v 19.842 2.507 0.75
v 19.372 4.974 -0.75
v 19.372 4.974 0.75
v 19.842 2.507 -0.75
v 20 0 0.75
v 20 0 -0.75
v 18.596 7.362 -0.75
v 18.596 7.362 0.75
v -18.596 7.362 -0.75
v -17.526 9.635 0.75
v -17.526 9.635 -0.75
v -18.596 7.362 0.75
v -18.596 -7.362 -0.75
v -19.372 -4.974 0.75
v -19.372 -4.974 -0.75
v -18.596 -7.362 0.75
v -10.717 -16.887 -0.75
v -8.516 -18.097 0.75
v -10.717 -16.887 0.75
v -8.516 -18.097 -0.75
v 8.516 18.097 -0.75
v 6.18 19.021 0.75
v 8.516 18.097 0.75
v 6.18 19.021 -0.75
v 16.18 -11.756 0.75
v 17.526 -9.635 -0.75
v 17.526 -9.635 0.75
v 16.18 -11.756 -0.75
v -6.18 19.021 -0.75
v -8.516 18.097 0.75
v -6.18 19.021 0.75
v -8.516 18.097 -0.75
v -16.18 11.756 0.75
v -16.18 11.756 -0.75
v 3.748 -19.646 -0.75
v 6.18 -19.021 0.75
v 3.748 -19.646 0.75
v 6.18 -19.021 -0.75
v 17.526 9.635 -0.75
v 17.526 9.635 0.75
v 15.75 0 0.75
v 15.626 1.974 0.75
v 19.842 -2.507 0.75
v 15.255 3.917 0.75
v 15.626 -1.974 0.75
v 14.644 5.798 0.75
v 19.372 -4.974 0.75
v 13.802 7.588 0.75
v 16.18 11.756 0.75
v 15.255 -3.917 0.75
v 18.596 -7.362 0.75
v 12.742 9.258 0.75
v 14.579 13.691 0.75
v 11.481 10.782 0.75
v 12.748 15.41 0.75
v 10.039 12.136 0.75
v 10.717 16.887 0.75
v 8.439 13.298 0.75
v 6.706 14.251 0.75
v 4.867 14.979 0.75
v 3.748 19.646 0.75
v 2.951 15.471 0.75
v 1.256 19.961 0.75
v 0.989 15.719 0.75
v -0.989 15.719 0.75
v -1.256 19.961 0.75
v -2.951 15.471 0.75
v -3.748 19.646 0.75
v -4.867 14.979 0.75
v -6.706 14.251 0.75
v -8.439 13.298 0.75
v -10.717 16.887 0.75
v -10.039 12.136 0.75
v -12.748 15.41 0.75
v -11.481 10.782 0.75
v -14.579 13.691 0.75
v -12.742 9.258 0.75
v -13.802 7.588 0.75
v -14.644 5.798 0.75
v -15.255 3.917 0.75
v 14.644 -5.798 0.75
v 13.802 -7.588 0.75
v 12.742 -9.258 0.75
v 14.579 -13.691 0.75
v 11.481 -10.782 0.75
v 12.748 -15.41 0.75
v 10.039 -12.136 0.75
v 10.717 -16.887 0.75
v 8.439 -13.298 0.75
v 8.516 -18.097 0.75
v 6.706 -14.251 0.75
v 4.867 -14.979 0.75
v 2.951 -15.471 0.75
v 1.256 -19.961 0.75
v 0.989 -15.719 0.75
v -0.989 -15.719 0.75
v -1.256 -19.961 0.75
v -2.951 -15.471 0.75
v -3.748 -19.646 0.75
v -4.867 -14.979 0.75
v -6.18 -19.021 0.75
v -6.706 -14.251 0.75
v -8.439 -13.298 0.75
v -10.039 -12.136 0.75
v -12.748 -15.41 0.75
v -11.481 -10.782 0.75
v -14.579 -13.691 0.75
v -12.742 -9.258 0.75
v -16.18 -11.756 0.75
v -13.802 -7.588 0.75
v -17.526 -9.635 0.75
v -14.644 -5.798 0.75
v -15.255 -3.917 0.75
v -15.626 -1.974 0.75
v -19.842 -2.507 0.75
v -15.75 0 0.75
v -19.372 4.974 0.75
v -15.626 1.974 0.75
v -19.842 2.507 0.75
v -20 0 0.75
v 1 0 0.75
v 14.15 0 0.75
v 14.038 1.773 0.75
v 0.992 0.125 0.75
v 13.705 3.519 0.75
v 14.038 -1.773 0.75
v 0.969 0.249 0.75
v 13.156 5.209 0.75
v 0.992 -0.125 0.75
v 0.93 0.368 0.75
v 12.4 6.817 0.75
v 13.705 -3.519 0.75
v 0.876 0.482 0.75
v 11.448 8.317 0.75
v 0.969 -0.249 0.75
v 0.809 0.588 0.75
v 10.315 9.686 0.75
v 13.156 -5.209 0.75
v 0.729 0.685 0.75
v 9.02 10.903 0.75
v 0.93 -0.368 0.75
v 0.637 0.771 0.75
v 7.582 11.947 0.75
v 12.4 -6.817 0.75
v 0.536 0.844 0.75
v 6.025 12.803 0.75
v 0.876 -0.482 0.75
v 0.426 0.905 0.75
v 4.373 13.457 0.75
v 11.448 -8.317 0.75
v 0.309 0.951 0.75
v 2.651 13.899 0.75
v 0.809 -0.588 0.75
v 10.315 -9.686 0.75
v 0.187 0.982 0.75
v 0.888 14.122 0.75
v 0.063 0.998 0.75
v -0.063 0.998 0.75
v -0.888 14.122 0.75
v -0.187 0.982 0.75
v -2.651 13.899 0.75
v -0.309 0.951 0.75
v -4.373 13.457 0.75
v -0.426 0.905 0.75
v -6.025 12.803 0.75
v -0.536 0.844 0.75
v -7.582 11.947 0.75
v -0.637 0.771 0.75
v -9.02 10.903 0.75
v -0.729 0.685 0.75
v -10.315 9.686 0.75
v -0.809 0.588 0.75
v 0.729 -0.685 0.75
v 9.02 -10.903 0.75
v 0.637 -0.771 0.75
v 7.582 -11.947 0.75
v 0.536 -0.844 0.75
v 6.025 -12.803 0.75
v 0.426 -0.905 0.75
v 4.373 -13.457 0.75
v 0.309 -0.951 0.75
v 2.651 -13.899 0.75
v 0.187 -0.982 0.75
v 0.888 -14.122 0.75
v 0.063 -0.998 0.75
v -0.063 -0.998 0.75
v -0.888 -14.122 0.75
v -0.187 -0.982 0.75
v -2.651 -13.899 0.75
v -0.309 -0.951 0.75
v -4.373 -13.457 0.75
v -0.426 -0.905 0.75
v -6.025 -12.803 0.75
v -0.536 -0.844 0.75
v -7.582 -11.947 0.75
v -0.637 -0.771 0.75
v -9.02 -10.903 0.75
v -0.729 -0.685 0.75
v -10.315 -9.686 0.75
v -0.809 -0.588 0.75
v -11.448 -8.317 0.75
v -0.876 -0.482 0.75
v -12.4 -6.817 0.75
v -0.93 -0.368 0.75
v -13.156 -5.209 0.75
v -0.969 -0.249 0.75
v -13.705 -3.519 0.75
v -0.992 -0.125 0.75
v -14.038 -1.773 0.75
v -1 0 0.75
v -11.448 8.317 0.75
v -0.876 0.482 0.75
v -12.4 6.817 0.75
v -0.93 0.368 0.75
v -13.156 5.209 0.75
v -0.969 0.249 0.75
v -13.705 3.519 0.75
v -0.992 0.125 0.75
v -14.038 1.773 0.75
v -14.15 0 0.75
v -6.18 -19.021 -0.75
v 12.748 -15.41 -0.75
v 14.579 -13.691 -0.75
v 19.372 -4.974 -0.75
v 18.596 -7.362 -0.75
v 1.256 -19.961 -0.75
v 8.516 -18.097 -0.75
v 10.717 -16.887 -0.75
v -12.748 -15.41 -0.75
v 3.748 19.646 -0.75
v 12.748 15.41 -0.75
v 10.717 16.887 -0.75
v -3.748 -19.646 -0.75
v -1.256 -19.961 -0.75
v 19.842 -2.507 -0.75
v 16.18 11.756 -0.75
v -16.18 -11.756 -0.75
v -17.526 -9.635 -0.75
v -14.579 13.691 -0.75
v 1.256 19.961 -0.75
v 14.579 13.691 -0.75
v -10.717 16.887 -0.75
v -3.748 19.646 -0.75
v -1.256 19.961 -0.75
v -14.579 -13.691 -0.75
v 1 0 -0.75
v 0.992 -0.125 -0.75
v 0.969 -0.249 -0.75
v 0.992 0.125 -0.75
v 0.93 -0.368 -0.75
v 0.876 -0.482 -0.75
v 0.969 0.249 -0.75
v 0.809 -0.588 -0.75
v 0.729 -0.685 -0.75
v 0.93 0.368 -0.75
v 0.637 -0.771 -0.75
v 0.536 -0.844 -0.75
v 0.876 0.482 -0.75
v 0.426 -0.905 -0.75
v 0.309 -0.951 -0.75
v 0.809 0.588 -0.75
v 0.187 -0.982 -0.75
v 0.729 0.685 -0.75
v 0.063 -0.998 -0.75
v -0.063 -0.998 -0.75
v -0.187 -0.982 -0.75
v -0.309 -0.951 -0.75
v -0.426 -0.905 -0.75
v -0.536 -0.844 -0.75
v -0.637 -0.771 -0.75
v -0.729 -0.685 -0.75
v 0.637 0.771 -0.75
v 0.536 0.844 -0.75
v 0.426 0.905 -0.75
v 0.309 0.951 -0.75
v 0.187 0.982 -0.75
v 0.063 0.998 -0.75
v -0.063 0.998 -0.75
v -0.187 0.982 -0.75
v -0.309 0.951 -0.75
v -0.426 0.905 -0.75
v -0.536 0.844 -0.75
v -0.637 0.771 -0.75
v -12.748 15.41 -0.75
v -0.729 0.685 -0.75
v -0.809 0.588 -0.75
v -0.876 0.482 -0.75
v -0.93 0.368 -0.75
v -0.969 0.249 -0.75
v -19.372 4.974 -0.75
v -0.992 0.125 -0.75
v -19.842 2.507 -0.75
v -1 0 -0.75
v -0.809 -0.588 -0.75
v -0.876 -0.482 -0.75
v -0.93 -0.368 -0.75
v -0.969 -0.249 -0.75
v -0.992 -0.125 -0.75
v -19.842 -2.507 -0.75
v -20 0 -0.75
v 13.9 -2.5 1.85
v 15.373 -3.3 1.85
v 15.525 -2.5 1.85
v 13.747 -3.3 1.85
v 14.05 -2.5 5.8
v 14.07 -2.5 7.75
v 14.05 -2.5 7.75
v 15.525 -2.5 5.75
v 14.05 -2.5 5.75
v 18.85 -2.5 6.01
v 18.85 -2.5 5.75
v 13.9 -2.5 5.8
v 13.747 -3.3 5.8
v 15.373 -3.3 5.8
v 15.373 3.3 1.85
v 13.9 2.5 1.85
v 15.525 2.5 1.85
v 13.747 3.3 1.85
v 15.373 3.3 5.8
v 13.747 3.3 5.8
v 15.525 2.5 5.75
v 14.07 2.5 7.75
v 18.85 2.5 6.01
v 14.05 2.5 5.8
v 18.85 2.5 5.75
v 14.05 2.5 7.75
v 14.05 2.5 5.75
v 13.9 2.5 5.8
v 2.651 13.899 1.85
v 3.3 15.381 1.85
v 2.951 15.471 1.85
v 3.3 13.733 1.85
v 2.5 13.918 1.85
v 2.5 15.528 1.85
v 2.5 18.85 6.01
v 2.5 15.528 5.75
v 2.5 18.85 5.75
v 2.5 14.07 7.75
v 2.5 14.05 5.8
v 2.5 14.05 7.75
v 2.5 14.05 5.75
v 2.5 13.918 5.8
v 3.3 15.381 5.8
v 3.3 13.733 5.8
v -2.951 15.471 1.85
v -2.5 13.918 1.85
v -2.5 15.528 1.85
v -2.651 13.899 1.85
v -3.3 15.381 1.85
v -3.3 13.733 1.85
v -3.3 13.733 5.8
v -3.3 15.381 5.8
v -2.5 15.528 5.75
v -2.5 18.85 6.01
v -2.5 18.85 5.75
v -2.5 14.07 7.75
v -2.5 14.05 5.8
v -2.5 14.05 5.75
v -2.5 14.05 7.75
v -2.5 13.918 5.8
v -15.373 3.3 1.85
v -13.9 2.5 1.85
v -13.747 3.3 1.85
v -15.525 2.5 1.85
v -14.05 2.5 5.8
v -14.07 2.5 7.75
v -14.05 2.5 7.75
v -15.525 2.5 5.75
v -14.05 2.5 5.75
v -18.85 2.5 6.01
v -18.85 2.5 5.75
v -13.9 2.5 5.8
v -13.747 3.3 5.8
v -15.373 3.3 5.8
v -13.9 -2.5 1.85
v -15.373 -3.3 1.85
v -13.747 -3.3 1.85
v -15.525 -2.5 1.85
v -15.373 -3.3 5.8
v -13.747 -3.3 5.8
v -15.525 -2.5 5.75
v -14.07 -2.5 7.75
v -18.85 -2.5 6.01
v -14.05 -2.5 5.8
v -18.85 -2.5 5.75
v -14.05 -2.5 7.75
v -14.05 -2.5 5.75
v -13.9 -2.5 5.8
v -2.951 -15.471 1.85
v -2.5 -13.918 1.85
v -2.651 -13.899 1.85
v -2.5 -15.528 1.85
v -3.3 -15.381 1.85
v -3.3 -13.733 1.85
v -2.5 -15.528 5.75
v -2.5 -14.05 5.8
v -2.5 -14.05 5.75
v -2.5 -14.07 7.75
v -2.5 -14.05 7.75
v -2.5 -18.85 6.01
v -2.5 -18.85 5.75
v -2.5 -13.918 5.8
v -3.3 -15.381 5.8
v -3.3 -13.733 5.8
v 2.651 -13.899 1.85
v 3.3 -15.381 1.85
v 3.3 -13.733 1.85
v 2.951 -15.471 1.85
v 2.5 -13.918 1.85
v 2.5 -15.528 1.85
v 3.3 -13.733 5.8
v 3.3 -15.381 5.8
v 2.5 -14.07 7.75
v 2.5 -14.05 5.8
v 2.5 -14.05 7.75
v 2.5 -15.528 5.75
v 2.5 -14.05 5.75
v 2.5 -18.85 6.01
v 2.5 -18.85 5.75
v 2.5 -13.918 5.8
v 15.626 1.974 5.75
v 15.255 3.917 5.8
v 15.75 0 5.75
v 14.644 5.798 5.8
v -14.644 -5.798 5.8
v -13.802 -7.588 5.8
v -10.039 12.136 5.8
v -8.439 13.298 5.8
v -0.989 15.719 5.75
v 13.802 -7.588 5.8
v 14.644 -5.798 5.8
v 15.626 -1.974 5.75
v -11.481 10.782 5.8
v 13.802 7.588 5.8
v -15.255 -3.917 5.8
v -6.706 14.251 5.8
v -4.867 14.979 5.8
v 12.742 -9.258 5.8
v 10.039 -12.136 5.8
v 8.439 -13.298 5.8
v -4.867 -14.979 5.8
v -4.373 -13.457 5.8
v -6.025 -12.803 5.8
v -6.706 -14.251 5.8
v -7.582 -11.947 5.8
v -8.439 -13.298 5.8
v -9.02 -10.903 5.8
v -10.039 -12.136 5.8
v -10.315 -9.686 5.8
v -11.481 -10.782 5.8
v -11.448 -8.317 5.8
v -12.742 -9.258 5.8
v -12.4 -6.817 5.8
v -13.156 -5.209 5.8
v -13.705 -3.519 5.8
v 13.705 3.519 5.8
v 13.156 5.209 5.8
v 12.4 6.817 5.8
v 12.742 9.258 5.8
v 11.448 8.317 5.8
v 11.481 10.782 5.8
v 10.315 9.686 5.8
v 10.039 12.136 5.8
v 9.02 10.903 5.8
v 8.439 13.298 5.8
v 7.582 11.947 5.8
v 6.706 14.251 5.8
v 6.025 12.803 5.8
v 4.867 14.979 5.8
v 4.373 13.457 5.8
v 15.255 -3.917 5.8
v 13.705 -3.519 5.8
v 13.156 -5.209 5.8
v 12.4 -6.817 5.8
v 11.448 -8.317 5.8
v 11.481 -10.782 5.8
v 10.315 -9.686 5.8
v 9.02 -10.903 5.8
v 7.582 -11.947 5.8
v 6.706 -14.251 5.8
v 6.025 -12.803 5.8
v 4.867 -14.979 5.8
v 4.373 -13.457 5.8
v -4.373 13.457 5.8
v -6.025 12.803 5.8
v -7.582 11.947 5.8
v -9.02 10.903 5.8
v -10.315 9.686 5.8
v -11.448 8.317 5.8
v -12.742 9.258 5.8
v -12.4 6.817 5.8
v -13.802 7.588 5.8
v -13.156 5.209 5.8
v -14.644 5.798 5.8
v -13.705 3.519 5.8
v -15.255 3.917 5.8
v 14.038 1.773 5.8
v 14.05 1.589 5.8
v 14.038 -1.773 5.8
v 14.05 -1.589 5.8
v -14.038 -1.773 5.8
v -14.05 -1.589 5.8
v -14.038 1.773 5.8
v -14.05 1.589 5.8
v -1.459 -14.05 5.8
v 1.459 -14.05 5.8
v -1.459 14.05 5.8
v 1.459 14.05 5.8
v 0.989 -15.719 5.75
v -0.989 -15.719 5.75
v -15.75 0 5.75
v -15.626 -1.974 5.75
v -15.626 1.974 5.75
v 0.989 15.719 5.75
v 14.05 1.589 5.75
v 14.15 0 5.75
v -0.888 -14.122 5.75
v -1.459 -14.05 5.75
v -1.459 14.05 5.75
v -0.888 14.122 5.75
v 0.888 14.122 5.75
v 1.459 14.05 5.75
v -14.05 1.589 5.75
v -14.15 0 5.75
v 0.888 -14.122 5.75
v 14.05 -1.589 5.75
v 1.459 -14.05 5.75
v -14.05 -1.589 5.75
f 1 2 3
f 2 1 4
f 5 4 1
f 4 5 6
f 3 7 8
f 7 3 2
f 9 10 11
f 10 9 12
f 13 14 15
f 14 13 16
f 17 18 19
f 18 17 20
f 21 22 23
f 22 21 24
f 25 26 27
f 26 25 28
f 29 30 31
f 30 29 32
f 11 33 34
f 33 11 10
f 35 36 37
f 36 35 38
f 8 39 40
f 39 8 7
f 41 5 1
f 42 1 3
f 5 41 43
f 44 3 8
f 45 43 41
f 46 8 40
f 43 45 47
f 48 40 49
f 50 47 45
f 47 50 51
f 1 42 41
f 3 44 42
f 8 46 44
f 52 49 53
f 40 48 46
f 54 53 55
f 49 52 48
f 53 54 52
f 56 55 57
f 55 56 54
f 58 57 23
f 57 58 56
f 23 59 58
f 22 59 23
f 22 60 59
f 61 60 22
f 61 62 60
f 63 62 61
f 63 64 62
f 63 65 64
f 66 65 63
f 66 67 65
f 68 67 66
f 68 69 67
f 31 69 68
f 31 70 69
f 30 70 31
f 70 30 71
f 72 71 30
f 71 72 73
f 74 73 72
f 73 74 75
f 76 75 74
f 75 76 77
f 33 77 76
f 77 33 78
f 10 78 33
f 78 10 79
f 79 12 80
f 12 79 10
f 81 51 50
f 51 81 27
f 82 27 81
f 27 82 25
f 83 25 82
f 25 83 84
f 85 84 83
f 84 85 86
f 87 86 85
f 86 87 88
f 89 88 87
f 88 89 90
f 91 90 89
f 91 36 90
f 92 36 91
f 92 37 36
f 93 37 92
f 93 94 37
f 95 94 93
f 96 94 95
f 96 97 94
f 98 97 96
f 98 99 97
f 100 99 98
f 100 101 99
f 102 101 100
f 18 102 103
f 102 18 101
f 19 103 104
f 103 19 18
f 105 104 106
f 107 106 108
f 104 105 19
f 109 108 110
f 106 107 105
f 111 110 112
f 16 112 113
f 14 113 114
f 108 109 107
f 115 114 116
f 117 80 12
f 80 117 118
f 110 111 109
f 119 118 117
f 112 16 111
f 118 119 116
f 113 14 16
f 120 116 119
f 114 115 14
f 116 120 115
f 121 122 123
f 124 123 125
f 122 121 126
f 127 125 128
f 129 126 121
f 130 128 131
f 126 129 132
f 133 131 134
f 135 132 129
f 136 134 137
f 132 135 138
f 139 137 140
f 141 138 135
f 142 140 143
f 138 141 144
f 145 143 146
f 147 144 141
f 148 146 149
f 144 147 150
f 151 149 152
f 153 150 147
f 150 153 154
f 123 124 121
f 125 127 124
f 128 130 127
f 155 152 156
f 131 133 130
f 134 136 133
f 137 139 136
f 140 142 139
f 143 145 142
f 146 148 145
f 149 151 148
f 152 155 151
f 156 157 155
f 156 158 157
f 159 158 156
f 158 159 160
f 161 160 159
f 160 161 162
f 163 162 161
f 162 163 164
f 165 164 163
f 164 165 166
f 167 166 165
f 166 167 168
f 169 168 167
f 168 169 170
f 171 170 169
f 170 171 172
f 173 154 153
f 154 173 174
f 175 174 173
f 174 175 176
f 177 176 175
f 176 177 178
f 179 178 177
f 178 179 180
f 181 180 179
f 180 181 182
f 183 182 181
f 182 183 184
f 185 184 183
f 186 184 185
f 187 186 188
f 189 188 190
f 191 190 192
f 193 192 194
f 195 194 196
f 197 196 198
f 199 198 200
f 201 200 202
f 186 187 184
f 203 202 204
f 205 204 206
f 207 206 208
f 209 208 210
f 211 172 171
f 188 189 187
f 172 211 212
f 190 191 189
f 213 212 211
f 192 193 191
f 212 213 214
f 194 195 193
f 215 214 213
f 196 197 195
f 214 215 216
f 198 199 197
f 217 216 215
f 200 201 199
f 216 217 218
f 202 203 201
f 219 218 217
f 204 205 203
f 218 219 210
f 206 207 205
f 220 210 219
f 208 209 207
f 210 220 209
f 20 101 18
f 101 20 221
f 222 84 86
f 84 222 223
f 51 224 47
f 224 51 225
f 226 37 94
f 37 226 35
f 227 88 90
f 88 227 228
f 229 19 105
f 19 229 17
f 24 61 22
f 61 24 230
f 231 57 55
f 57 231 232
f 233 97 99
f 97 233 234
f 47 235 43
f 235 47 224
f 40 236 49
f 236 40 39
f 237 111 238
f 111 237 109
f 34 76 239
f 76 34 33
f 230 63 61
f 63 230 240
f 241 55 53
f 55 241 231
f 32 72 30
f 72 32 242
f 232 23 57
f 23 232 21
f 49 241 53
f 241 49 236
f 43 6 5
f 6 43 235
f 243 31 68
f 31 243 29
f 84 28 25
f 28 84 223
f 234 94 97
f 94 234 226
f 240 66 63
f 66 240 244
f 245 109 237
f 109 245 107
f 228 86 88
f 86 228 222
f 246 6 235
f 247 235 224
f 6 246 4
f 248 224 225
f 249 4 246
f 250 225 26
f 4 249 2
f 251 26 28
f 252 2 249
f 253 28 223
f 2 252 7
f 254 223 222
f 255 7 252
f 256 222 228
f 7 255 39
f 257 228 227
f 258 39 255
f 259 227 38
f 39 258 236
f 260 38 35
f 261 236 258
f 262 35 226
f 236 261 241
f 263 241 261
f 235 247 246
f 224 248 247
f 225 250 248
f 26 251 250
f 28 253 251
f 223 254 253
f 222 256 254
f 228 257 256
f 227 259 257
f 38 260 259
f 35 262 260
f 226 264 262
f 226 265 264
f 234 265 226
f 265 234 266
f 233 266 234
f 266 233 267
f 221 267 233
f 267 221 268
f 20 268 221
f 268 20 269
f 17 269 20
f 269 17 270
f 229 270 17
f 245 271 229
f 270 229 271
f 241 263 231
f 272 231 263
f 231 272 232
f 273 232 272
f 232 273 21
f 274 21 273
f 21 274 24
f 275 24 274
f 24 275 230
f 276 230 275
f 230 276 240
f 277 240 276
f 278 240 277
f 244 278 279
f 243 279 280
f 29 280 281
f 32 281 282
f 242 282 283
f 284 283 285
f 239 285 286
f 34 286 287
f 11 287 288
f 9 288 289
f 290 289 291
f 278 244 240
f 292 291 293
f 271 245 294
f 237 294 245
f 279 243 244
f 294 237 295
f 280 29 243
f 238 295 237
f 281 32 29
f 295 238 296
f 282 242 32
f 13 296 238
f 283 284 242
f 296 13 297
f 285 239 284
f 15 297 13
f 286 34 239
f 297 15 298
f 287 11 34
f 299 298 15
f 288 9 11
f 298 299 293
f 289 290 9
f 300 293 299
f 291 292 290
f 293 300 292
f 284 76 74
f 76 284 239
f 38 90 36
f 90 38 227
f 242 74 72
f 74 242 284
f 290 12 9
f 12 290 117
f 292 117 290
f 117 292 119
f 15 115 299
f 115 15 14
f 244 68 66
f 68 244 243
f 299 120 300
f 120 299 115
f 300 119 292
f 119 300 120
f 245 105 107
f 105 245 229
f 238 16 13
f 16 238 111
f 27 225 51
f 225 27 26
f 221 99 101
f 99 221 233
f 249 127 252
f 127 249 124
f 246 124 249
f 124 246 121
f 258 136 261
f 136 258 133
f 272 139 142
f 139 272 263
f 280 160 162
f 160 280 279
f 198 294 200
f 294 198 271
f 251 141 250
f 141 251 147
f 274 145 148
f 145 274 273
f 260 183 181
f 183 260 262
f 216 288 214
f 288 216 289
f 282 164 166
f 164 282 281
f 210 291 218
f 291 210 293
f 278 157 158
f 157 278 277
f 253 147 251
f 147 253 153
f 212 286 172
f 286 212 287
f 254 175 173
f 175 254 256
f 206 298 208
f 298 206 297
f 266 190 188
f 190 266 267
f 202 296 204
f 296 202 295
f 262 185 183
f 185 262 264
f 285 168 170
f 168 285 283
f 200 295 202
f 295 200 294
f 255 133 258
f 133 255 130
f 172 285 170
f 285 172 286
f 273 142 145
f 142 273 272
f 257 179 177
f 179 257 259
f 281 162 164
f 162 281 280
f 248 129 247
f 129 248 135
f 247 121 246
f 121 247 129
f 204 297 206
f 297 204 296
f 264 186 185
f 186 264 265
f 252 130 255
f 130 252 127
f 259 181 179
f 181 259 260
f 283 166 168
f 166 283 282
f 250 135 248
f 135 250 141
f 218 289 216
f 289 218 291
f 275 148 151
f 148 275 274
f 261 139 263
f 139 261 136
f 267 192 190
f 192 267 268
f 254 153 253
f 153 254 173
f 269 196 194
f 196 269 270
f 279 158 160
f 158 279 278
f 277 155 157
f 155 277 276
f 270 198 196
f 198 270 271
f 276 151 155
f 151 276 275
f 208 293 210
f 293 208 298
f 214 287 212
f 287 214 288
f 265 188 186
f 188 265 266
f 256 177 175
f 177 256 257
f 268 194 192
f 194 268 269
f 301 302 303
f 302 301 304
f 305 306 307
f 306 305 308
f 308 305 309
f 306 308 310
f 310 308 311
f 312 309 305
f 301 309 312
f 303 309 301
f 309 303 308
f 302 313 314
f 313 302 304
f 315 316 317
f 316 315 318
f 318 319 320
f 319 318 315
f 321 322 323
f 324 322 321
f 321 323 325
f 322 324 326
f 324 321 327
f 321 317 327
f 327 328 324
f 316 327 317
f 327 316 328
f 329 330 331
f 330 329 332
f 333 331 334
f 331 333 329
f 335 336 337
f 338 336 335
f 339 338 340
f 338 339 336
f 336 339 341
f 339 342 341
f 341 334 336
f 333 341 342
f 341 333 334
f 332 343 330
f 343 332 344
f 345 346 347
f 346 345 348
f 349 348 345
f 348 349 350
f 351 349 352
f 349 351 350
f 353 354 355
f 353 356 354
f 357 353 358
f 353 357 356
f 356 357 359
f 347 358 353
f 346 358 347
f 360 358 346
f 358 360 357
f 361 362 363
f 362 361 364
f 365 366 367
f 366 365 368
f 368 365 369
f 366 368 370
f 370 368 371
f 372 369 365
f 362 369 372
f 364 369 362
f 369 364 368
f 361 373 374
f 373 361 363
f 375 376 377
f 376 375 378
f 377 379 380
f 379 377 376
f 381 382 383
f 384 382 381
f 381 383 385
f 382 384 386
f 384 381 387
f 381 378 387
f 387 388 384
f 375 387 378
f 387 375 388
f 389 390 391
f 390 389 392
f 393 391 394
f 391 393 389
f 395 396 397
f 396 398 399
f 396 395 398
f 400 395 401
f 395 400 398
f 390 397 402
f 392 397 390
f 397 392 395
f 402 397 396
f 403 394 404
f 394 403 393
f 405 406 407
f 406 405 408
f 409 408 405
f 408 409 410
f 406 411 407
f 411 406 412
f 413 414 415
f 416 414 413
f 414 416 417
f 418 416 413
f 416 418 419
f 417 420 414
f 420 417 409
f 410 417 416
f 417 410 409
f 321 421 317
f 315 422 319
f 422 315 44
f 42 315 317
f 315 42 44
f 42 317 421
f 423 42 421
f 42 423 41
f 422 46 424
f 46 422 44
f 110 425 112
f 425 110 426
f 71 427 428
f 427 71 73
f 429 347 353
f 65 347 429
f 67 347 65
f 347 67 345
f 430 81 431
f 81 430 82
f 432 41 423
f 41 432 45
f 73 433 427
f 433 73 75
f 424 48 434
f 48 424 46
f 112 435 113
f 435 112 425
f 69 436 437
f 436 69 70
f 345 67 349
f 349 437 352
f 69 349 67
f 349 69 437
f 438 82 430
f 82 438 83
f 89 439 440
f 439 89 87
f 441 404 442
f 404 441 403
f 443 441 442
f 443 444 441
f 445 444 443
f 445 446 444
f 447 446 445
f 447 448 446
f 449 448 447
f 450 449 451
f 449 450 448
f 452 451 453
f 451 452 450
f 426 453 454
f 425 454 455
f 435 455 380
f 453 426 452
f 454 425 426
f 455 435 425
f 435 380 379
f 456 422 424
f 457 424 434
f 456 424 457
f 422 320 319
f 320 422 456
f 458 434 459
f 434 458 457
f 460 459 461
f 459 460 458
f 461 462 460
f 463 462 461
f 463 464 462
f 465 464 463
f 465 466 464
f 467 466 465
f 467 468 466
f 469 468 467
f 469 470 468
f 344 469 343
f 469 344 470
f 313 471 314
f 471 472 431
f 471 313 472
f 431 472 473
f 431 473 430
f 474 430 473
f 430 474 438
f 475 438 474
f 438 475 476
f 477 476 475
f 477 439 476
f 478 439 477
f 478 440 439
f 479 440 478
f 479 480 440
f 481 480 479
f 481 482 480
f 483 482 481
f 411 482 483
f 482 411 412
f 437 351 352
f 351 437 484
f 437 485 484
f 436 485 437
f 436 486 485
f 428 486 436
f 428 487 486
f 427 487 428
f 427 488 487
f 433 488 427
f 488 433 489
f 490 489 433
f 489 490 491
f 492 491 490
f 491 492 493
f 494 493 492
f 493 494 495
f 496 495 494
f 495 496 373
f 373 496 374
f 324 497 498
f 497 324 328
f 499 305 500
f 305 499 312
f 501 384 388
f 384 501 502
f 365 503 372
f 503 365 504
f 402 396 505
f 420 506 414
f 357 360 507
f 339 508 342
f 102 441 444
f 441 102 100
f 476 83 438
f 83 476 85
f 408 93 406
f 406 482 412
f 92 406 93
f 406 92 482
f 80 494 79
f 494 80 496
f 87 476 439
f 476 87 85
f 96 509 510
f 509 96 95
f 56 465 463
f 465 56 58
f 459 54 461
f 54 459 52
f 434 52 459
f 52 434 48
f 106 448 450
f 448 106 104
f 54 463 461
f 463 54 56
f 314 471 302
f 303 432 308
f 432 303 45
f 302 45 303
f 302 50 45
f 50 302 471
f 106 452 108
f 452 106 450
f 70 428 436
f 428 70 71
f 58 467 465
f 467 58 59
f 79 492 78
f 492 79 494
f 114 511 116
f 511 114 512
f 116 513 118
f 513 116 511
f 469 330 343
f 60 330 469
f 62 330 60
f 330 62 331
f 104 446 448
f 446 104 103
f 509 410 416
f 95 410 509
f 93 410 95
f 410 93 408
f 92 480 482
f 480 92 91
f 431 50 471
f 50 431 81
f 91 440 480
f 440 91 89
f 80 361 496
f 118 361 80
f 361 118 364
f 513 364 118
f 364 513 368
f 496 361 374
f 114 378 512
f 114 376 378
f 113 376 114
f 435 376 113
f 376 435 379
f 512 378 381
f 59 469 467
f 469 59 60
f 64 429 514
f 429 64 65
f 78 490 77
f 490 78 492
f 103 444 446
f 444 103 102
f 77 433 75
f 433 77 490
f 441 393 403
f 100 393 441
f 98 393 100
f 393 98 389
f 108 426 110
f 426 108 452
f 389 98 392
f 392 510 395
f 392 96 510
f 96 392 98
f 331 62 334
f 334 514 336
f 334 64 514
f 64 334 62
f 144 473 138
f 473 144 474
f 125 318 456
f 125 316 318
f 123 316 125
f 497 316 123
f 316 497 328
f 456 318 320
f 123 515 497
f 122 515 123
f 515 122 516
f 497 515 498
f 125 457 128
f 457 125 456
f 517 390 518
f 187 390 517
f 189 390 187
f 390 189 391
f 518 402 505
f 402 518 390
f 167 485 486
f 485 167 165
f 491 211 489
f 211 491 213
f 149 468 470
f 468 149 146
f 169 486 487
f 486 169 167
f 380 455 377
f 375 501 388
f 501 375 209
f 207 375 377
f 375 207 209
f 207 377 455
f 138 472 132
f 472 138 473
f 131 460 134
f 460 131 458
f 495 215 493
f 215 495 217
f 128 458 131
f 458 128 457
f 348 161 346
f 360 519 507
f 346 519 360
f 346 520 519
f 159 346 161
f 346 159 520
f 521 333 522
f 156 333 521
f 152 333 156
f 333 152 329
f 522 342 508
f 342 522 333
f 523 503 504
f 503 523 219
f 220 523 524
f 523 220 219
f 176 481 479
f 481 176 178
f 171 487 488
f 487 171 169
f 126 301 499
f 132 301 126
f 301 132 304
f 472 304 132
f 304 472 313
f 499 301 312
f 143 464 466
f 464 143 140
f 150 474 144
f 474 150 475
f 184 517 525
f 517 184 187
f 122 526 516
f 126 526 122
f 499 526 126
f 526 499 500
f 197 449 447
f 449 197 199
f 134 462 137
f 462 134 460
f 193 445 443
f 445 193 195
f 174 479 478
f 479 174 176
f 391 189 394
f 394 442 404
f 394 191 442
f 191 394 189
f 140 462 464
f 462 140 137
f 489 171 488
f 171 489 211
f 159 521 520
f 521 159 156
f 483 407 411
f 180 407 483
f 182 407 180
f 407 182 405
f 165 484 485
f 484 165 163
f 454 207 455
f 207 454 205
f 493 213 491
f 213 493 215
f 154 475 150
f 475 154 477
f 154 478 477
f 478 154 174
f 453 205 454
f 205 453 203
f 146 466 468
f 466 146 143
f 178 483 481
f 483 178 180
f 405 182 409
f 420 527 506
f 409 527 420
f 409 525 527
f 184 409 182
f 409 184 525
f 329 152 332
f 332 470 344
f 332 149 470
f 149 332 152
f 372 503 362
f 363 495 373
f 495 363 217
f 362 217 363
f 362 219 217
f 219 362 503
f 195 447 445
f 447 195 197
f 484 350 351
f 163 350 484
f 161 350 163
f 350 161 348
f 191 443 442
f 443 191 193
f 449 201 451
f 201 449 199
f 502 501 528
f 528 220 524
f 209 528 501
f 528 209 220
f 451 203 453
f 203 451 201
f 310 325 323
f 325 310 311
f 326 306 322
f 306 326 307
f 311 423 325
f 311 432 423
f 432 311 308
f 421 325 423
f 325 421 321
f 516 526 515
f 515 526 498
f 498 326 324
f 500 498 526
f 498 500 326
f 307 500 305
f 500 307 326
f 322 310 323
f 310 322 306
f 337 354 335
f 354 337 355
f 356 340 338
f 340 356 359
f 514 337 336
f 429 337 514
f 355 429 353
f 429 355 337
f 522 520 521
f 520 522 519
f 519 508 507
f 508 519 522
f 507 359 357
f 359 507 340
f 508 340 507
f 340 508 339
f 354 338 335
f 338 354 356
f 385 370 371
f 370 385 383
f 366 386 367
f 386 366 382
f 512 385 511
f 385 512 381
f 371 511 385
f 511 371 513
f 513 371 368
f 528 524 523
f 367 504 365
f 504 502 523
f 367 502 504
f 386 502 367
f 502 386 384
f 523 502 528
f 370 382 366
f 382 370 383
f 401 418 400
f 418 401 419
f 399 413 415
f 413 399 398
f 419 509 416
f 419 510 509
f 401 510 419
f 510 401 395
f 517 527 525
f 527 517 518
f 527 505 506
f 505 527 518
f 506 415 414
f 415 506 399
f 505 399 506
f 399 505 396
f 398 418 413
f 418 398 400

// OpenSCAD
/* [Base Dimensions] */
//Base Diameter
base_diameter = 40; // [15:1:100]
//Base thickness
base_thickness = 1.5; // [0.5:0.25:3]
//Base cutout diameter (0=none)
base_cutout_diameter = 2; // [0:0.1:1]

/* [Hole Dimensions] */
//Hole diameter
hole_diameter = 31.5; // [15:1:100]
//Hole depth/height
hole_height = 5; // [0.5:0.25:10]

/* [Tab Dimensions] */
//Number of retaining tabs
number_of_tabs = 4; // [2:1:20]
//Retaining tab width (each)
tab_width = 5; // [0.5:0.5:8]
//Tab leg height (needs to be long enough to allow some flexing, 4 recommended)
tab_height = 4; // [1:0.5:10]

/* [Miscellaneous] */
// Smoothness
smoothness=50; // [25:5:100]

//-------------------------------------------
$fn=smoothness;
nozzle_diameter = 0.4;
wall_thickness = 4 * nozzle_diameter;
base_radius = base_diameter / 2;
hole_radius = hole_diameter / 2;

module cutout_tab_sides() {
    for (i = [0:360/number_of_tabs:360]) {
        rotate([0,0,i])
        translate([hole_radius - 0.6,0,hole_height/2 - tab_height/2 + 0.1]) {
            translate([0,-tab_width/2 - 0.4,0])
            cube([wall_thickness * 2, 0.8, tab_height], center=true);
            translate([0,tab_width/2 + 0.4,0])
            cube([wall_thickness * 2, 0.8, tab_height], center=true);
        }
    }
}

module tab_top() {
    difference() {
        cube([wall_thickness * 3,tab_width,2], center=true);
        
        translate([1,0,1.1])
        rotate([0,20,0])
        cube([wall_thickness * 4,tab_width+0.2,2.5], center=true);
    }
}

module tab_tops() {
    for (i = [0:360/number_of_tabs:360]) {
        rotate([0,0,i])
        translate([hole_radius+0.7,0,hole_height+1])
        tab_top();
    }
}

module inner() {
    translate([0,0,hole_height/2]) {
        difference() {
            cylinder(r=hole_radius, h=hole_height + 0.1, center=true);
            cylinder(r=hole_radius - wall_thickness, h=hole_height + 0.2, center=true);
            cutout_tab_sides();
        }
    }
    
    tab_tops();
}

module base() {
    if (base_cutout_diameter > 0) {
        difference() {
            cylinder(r=base_radius, h=base_thickness, center=true);
            cylinder(r=base_cutout_diameter/2, h=base_thickness+0.2, center=true);
        }
    } else {
        cylinder(r=base_radius, h=base_thickness, center=true);
    }
}

base();

translate([0,0,base_thickness/2])
    inner();
